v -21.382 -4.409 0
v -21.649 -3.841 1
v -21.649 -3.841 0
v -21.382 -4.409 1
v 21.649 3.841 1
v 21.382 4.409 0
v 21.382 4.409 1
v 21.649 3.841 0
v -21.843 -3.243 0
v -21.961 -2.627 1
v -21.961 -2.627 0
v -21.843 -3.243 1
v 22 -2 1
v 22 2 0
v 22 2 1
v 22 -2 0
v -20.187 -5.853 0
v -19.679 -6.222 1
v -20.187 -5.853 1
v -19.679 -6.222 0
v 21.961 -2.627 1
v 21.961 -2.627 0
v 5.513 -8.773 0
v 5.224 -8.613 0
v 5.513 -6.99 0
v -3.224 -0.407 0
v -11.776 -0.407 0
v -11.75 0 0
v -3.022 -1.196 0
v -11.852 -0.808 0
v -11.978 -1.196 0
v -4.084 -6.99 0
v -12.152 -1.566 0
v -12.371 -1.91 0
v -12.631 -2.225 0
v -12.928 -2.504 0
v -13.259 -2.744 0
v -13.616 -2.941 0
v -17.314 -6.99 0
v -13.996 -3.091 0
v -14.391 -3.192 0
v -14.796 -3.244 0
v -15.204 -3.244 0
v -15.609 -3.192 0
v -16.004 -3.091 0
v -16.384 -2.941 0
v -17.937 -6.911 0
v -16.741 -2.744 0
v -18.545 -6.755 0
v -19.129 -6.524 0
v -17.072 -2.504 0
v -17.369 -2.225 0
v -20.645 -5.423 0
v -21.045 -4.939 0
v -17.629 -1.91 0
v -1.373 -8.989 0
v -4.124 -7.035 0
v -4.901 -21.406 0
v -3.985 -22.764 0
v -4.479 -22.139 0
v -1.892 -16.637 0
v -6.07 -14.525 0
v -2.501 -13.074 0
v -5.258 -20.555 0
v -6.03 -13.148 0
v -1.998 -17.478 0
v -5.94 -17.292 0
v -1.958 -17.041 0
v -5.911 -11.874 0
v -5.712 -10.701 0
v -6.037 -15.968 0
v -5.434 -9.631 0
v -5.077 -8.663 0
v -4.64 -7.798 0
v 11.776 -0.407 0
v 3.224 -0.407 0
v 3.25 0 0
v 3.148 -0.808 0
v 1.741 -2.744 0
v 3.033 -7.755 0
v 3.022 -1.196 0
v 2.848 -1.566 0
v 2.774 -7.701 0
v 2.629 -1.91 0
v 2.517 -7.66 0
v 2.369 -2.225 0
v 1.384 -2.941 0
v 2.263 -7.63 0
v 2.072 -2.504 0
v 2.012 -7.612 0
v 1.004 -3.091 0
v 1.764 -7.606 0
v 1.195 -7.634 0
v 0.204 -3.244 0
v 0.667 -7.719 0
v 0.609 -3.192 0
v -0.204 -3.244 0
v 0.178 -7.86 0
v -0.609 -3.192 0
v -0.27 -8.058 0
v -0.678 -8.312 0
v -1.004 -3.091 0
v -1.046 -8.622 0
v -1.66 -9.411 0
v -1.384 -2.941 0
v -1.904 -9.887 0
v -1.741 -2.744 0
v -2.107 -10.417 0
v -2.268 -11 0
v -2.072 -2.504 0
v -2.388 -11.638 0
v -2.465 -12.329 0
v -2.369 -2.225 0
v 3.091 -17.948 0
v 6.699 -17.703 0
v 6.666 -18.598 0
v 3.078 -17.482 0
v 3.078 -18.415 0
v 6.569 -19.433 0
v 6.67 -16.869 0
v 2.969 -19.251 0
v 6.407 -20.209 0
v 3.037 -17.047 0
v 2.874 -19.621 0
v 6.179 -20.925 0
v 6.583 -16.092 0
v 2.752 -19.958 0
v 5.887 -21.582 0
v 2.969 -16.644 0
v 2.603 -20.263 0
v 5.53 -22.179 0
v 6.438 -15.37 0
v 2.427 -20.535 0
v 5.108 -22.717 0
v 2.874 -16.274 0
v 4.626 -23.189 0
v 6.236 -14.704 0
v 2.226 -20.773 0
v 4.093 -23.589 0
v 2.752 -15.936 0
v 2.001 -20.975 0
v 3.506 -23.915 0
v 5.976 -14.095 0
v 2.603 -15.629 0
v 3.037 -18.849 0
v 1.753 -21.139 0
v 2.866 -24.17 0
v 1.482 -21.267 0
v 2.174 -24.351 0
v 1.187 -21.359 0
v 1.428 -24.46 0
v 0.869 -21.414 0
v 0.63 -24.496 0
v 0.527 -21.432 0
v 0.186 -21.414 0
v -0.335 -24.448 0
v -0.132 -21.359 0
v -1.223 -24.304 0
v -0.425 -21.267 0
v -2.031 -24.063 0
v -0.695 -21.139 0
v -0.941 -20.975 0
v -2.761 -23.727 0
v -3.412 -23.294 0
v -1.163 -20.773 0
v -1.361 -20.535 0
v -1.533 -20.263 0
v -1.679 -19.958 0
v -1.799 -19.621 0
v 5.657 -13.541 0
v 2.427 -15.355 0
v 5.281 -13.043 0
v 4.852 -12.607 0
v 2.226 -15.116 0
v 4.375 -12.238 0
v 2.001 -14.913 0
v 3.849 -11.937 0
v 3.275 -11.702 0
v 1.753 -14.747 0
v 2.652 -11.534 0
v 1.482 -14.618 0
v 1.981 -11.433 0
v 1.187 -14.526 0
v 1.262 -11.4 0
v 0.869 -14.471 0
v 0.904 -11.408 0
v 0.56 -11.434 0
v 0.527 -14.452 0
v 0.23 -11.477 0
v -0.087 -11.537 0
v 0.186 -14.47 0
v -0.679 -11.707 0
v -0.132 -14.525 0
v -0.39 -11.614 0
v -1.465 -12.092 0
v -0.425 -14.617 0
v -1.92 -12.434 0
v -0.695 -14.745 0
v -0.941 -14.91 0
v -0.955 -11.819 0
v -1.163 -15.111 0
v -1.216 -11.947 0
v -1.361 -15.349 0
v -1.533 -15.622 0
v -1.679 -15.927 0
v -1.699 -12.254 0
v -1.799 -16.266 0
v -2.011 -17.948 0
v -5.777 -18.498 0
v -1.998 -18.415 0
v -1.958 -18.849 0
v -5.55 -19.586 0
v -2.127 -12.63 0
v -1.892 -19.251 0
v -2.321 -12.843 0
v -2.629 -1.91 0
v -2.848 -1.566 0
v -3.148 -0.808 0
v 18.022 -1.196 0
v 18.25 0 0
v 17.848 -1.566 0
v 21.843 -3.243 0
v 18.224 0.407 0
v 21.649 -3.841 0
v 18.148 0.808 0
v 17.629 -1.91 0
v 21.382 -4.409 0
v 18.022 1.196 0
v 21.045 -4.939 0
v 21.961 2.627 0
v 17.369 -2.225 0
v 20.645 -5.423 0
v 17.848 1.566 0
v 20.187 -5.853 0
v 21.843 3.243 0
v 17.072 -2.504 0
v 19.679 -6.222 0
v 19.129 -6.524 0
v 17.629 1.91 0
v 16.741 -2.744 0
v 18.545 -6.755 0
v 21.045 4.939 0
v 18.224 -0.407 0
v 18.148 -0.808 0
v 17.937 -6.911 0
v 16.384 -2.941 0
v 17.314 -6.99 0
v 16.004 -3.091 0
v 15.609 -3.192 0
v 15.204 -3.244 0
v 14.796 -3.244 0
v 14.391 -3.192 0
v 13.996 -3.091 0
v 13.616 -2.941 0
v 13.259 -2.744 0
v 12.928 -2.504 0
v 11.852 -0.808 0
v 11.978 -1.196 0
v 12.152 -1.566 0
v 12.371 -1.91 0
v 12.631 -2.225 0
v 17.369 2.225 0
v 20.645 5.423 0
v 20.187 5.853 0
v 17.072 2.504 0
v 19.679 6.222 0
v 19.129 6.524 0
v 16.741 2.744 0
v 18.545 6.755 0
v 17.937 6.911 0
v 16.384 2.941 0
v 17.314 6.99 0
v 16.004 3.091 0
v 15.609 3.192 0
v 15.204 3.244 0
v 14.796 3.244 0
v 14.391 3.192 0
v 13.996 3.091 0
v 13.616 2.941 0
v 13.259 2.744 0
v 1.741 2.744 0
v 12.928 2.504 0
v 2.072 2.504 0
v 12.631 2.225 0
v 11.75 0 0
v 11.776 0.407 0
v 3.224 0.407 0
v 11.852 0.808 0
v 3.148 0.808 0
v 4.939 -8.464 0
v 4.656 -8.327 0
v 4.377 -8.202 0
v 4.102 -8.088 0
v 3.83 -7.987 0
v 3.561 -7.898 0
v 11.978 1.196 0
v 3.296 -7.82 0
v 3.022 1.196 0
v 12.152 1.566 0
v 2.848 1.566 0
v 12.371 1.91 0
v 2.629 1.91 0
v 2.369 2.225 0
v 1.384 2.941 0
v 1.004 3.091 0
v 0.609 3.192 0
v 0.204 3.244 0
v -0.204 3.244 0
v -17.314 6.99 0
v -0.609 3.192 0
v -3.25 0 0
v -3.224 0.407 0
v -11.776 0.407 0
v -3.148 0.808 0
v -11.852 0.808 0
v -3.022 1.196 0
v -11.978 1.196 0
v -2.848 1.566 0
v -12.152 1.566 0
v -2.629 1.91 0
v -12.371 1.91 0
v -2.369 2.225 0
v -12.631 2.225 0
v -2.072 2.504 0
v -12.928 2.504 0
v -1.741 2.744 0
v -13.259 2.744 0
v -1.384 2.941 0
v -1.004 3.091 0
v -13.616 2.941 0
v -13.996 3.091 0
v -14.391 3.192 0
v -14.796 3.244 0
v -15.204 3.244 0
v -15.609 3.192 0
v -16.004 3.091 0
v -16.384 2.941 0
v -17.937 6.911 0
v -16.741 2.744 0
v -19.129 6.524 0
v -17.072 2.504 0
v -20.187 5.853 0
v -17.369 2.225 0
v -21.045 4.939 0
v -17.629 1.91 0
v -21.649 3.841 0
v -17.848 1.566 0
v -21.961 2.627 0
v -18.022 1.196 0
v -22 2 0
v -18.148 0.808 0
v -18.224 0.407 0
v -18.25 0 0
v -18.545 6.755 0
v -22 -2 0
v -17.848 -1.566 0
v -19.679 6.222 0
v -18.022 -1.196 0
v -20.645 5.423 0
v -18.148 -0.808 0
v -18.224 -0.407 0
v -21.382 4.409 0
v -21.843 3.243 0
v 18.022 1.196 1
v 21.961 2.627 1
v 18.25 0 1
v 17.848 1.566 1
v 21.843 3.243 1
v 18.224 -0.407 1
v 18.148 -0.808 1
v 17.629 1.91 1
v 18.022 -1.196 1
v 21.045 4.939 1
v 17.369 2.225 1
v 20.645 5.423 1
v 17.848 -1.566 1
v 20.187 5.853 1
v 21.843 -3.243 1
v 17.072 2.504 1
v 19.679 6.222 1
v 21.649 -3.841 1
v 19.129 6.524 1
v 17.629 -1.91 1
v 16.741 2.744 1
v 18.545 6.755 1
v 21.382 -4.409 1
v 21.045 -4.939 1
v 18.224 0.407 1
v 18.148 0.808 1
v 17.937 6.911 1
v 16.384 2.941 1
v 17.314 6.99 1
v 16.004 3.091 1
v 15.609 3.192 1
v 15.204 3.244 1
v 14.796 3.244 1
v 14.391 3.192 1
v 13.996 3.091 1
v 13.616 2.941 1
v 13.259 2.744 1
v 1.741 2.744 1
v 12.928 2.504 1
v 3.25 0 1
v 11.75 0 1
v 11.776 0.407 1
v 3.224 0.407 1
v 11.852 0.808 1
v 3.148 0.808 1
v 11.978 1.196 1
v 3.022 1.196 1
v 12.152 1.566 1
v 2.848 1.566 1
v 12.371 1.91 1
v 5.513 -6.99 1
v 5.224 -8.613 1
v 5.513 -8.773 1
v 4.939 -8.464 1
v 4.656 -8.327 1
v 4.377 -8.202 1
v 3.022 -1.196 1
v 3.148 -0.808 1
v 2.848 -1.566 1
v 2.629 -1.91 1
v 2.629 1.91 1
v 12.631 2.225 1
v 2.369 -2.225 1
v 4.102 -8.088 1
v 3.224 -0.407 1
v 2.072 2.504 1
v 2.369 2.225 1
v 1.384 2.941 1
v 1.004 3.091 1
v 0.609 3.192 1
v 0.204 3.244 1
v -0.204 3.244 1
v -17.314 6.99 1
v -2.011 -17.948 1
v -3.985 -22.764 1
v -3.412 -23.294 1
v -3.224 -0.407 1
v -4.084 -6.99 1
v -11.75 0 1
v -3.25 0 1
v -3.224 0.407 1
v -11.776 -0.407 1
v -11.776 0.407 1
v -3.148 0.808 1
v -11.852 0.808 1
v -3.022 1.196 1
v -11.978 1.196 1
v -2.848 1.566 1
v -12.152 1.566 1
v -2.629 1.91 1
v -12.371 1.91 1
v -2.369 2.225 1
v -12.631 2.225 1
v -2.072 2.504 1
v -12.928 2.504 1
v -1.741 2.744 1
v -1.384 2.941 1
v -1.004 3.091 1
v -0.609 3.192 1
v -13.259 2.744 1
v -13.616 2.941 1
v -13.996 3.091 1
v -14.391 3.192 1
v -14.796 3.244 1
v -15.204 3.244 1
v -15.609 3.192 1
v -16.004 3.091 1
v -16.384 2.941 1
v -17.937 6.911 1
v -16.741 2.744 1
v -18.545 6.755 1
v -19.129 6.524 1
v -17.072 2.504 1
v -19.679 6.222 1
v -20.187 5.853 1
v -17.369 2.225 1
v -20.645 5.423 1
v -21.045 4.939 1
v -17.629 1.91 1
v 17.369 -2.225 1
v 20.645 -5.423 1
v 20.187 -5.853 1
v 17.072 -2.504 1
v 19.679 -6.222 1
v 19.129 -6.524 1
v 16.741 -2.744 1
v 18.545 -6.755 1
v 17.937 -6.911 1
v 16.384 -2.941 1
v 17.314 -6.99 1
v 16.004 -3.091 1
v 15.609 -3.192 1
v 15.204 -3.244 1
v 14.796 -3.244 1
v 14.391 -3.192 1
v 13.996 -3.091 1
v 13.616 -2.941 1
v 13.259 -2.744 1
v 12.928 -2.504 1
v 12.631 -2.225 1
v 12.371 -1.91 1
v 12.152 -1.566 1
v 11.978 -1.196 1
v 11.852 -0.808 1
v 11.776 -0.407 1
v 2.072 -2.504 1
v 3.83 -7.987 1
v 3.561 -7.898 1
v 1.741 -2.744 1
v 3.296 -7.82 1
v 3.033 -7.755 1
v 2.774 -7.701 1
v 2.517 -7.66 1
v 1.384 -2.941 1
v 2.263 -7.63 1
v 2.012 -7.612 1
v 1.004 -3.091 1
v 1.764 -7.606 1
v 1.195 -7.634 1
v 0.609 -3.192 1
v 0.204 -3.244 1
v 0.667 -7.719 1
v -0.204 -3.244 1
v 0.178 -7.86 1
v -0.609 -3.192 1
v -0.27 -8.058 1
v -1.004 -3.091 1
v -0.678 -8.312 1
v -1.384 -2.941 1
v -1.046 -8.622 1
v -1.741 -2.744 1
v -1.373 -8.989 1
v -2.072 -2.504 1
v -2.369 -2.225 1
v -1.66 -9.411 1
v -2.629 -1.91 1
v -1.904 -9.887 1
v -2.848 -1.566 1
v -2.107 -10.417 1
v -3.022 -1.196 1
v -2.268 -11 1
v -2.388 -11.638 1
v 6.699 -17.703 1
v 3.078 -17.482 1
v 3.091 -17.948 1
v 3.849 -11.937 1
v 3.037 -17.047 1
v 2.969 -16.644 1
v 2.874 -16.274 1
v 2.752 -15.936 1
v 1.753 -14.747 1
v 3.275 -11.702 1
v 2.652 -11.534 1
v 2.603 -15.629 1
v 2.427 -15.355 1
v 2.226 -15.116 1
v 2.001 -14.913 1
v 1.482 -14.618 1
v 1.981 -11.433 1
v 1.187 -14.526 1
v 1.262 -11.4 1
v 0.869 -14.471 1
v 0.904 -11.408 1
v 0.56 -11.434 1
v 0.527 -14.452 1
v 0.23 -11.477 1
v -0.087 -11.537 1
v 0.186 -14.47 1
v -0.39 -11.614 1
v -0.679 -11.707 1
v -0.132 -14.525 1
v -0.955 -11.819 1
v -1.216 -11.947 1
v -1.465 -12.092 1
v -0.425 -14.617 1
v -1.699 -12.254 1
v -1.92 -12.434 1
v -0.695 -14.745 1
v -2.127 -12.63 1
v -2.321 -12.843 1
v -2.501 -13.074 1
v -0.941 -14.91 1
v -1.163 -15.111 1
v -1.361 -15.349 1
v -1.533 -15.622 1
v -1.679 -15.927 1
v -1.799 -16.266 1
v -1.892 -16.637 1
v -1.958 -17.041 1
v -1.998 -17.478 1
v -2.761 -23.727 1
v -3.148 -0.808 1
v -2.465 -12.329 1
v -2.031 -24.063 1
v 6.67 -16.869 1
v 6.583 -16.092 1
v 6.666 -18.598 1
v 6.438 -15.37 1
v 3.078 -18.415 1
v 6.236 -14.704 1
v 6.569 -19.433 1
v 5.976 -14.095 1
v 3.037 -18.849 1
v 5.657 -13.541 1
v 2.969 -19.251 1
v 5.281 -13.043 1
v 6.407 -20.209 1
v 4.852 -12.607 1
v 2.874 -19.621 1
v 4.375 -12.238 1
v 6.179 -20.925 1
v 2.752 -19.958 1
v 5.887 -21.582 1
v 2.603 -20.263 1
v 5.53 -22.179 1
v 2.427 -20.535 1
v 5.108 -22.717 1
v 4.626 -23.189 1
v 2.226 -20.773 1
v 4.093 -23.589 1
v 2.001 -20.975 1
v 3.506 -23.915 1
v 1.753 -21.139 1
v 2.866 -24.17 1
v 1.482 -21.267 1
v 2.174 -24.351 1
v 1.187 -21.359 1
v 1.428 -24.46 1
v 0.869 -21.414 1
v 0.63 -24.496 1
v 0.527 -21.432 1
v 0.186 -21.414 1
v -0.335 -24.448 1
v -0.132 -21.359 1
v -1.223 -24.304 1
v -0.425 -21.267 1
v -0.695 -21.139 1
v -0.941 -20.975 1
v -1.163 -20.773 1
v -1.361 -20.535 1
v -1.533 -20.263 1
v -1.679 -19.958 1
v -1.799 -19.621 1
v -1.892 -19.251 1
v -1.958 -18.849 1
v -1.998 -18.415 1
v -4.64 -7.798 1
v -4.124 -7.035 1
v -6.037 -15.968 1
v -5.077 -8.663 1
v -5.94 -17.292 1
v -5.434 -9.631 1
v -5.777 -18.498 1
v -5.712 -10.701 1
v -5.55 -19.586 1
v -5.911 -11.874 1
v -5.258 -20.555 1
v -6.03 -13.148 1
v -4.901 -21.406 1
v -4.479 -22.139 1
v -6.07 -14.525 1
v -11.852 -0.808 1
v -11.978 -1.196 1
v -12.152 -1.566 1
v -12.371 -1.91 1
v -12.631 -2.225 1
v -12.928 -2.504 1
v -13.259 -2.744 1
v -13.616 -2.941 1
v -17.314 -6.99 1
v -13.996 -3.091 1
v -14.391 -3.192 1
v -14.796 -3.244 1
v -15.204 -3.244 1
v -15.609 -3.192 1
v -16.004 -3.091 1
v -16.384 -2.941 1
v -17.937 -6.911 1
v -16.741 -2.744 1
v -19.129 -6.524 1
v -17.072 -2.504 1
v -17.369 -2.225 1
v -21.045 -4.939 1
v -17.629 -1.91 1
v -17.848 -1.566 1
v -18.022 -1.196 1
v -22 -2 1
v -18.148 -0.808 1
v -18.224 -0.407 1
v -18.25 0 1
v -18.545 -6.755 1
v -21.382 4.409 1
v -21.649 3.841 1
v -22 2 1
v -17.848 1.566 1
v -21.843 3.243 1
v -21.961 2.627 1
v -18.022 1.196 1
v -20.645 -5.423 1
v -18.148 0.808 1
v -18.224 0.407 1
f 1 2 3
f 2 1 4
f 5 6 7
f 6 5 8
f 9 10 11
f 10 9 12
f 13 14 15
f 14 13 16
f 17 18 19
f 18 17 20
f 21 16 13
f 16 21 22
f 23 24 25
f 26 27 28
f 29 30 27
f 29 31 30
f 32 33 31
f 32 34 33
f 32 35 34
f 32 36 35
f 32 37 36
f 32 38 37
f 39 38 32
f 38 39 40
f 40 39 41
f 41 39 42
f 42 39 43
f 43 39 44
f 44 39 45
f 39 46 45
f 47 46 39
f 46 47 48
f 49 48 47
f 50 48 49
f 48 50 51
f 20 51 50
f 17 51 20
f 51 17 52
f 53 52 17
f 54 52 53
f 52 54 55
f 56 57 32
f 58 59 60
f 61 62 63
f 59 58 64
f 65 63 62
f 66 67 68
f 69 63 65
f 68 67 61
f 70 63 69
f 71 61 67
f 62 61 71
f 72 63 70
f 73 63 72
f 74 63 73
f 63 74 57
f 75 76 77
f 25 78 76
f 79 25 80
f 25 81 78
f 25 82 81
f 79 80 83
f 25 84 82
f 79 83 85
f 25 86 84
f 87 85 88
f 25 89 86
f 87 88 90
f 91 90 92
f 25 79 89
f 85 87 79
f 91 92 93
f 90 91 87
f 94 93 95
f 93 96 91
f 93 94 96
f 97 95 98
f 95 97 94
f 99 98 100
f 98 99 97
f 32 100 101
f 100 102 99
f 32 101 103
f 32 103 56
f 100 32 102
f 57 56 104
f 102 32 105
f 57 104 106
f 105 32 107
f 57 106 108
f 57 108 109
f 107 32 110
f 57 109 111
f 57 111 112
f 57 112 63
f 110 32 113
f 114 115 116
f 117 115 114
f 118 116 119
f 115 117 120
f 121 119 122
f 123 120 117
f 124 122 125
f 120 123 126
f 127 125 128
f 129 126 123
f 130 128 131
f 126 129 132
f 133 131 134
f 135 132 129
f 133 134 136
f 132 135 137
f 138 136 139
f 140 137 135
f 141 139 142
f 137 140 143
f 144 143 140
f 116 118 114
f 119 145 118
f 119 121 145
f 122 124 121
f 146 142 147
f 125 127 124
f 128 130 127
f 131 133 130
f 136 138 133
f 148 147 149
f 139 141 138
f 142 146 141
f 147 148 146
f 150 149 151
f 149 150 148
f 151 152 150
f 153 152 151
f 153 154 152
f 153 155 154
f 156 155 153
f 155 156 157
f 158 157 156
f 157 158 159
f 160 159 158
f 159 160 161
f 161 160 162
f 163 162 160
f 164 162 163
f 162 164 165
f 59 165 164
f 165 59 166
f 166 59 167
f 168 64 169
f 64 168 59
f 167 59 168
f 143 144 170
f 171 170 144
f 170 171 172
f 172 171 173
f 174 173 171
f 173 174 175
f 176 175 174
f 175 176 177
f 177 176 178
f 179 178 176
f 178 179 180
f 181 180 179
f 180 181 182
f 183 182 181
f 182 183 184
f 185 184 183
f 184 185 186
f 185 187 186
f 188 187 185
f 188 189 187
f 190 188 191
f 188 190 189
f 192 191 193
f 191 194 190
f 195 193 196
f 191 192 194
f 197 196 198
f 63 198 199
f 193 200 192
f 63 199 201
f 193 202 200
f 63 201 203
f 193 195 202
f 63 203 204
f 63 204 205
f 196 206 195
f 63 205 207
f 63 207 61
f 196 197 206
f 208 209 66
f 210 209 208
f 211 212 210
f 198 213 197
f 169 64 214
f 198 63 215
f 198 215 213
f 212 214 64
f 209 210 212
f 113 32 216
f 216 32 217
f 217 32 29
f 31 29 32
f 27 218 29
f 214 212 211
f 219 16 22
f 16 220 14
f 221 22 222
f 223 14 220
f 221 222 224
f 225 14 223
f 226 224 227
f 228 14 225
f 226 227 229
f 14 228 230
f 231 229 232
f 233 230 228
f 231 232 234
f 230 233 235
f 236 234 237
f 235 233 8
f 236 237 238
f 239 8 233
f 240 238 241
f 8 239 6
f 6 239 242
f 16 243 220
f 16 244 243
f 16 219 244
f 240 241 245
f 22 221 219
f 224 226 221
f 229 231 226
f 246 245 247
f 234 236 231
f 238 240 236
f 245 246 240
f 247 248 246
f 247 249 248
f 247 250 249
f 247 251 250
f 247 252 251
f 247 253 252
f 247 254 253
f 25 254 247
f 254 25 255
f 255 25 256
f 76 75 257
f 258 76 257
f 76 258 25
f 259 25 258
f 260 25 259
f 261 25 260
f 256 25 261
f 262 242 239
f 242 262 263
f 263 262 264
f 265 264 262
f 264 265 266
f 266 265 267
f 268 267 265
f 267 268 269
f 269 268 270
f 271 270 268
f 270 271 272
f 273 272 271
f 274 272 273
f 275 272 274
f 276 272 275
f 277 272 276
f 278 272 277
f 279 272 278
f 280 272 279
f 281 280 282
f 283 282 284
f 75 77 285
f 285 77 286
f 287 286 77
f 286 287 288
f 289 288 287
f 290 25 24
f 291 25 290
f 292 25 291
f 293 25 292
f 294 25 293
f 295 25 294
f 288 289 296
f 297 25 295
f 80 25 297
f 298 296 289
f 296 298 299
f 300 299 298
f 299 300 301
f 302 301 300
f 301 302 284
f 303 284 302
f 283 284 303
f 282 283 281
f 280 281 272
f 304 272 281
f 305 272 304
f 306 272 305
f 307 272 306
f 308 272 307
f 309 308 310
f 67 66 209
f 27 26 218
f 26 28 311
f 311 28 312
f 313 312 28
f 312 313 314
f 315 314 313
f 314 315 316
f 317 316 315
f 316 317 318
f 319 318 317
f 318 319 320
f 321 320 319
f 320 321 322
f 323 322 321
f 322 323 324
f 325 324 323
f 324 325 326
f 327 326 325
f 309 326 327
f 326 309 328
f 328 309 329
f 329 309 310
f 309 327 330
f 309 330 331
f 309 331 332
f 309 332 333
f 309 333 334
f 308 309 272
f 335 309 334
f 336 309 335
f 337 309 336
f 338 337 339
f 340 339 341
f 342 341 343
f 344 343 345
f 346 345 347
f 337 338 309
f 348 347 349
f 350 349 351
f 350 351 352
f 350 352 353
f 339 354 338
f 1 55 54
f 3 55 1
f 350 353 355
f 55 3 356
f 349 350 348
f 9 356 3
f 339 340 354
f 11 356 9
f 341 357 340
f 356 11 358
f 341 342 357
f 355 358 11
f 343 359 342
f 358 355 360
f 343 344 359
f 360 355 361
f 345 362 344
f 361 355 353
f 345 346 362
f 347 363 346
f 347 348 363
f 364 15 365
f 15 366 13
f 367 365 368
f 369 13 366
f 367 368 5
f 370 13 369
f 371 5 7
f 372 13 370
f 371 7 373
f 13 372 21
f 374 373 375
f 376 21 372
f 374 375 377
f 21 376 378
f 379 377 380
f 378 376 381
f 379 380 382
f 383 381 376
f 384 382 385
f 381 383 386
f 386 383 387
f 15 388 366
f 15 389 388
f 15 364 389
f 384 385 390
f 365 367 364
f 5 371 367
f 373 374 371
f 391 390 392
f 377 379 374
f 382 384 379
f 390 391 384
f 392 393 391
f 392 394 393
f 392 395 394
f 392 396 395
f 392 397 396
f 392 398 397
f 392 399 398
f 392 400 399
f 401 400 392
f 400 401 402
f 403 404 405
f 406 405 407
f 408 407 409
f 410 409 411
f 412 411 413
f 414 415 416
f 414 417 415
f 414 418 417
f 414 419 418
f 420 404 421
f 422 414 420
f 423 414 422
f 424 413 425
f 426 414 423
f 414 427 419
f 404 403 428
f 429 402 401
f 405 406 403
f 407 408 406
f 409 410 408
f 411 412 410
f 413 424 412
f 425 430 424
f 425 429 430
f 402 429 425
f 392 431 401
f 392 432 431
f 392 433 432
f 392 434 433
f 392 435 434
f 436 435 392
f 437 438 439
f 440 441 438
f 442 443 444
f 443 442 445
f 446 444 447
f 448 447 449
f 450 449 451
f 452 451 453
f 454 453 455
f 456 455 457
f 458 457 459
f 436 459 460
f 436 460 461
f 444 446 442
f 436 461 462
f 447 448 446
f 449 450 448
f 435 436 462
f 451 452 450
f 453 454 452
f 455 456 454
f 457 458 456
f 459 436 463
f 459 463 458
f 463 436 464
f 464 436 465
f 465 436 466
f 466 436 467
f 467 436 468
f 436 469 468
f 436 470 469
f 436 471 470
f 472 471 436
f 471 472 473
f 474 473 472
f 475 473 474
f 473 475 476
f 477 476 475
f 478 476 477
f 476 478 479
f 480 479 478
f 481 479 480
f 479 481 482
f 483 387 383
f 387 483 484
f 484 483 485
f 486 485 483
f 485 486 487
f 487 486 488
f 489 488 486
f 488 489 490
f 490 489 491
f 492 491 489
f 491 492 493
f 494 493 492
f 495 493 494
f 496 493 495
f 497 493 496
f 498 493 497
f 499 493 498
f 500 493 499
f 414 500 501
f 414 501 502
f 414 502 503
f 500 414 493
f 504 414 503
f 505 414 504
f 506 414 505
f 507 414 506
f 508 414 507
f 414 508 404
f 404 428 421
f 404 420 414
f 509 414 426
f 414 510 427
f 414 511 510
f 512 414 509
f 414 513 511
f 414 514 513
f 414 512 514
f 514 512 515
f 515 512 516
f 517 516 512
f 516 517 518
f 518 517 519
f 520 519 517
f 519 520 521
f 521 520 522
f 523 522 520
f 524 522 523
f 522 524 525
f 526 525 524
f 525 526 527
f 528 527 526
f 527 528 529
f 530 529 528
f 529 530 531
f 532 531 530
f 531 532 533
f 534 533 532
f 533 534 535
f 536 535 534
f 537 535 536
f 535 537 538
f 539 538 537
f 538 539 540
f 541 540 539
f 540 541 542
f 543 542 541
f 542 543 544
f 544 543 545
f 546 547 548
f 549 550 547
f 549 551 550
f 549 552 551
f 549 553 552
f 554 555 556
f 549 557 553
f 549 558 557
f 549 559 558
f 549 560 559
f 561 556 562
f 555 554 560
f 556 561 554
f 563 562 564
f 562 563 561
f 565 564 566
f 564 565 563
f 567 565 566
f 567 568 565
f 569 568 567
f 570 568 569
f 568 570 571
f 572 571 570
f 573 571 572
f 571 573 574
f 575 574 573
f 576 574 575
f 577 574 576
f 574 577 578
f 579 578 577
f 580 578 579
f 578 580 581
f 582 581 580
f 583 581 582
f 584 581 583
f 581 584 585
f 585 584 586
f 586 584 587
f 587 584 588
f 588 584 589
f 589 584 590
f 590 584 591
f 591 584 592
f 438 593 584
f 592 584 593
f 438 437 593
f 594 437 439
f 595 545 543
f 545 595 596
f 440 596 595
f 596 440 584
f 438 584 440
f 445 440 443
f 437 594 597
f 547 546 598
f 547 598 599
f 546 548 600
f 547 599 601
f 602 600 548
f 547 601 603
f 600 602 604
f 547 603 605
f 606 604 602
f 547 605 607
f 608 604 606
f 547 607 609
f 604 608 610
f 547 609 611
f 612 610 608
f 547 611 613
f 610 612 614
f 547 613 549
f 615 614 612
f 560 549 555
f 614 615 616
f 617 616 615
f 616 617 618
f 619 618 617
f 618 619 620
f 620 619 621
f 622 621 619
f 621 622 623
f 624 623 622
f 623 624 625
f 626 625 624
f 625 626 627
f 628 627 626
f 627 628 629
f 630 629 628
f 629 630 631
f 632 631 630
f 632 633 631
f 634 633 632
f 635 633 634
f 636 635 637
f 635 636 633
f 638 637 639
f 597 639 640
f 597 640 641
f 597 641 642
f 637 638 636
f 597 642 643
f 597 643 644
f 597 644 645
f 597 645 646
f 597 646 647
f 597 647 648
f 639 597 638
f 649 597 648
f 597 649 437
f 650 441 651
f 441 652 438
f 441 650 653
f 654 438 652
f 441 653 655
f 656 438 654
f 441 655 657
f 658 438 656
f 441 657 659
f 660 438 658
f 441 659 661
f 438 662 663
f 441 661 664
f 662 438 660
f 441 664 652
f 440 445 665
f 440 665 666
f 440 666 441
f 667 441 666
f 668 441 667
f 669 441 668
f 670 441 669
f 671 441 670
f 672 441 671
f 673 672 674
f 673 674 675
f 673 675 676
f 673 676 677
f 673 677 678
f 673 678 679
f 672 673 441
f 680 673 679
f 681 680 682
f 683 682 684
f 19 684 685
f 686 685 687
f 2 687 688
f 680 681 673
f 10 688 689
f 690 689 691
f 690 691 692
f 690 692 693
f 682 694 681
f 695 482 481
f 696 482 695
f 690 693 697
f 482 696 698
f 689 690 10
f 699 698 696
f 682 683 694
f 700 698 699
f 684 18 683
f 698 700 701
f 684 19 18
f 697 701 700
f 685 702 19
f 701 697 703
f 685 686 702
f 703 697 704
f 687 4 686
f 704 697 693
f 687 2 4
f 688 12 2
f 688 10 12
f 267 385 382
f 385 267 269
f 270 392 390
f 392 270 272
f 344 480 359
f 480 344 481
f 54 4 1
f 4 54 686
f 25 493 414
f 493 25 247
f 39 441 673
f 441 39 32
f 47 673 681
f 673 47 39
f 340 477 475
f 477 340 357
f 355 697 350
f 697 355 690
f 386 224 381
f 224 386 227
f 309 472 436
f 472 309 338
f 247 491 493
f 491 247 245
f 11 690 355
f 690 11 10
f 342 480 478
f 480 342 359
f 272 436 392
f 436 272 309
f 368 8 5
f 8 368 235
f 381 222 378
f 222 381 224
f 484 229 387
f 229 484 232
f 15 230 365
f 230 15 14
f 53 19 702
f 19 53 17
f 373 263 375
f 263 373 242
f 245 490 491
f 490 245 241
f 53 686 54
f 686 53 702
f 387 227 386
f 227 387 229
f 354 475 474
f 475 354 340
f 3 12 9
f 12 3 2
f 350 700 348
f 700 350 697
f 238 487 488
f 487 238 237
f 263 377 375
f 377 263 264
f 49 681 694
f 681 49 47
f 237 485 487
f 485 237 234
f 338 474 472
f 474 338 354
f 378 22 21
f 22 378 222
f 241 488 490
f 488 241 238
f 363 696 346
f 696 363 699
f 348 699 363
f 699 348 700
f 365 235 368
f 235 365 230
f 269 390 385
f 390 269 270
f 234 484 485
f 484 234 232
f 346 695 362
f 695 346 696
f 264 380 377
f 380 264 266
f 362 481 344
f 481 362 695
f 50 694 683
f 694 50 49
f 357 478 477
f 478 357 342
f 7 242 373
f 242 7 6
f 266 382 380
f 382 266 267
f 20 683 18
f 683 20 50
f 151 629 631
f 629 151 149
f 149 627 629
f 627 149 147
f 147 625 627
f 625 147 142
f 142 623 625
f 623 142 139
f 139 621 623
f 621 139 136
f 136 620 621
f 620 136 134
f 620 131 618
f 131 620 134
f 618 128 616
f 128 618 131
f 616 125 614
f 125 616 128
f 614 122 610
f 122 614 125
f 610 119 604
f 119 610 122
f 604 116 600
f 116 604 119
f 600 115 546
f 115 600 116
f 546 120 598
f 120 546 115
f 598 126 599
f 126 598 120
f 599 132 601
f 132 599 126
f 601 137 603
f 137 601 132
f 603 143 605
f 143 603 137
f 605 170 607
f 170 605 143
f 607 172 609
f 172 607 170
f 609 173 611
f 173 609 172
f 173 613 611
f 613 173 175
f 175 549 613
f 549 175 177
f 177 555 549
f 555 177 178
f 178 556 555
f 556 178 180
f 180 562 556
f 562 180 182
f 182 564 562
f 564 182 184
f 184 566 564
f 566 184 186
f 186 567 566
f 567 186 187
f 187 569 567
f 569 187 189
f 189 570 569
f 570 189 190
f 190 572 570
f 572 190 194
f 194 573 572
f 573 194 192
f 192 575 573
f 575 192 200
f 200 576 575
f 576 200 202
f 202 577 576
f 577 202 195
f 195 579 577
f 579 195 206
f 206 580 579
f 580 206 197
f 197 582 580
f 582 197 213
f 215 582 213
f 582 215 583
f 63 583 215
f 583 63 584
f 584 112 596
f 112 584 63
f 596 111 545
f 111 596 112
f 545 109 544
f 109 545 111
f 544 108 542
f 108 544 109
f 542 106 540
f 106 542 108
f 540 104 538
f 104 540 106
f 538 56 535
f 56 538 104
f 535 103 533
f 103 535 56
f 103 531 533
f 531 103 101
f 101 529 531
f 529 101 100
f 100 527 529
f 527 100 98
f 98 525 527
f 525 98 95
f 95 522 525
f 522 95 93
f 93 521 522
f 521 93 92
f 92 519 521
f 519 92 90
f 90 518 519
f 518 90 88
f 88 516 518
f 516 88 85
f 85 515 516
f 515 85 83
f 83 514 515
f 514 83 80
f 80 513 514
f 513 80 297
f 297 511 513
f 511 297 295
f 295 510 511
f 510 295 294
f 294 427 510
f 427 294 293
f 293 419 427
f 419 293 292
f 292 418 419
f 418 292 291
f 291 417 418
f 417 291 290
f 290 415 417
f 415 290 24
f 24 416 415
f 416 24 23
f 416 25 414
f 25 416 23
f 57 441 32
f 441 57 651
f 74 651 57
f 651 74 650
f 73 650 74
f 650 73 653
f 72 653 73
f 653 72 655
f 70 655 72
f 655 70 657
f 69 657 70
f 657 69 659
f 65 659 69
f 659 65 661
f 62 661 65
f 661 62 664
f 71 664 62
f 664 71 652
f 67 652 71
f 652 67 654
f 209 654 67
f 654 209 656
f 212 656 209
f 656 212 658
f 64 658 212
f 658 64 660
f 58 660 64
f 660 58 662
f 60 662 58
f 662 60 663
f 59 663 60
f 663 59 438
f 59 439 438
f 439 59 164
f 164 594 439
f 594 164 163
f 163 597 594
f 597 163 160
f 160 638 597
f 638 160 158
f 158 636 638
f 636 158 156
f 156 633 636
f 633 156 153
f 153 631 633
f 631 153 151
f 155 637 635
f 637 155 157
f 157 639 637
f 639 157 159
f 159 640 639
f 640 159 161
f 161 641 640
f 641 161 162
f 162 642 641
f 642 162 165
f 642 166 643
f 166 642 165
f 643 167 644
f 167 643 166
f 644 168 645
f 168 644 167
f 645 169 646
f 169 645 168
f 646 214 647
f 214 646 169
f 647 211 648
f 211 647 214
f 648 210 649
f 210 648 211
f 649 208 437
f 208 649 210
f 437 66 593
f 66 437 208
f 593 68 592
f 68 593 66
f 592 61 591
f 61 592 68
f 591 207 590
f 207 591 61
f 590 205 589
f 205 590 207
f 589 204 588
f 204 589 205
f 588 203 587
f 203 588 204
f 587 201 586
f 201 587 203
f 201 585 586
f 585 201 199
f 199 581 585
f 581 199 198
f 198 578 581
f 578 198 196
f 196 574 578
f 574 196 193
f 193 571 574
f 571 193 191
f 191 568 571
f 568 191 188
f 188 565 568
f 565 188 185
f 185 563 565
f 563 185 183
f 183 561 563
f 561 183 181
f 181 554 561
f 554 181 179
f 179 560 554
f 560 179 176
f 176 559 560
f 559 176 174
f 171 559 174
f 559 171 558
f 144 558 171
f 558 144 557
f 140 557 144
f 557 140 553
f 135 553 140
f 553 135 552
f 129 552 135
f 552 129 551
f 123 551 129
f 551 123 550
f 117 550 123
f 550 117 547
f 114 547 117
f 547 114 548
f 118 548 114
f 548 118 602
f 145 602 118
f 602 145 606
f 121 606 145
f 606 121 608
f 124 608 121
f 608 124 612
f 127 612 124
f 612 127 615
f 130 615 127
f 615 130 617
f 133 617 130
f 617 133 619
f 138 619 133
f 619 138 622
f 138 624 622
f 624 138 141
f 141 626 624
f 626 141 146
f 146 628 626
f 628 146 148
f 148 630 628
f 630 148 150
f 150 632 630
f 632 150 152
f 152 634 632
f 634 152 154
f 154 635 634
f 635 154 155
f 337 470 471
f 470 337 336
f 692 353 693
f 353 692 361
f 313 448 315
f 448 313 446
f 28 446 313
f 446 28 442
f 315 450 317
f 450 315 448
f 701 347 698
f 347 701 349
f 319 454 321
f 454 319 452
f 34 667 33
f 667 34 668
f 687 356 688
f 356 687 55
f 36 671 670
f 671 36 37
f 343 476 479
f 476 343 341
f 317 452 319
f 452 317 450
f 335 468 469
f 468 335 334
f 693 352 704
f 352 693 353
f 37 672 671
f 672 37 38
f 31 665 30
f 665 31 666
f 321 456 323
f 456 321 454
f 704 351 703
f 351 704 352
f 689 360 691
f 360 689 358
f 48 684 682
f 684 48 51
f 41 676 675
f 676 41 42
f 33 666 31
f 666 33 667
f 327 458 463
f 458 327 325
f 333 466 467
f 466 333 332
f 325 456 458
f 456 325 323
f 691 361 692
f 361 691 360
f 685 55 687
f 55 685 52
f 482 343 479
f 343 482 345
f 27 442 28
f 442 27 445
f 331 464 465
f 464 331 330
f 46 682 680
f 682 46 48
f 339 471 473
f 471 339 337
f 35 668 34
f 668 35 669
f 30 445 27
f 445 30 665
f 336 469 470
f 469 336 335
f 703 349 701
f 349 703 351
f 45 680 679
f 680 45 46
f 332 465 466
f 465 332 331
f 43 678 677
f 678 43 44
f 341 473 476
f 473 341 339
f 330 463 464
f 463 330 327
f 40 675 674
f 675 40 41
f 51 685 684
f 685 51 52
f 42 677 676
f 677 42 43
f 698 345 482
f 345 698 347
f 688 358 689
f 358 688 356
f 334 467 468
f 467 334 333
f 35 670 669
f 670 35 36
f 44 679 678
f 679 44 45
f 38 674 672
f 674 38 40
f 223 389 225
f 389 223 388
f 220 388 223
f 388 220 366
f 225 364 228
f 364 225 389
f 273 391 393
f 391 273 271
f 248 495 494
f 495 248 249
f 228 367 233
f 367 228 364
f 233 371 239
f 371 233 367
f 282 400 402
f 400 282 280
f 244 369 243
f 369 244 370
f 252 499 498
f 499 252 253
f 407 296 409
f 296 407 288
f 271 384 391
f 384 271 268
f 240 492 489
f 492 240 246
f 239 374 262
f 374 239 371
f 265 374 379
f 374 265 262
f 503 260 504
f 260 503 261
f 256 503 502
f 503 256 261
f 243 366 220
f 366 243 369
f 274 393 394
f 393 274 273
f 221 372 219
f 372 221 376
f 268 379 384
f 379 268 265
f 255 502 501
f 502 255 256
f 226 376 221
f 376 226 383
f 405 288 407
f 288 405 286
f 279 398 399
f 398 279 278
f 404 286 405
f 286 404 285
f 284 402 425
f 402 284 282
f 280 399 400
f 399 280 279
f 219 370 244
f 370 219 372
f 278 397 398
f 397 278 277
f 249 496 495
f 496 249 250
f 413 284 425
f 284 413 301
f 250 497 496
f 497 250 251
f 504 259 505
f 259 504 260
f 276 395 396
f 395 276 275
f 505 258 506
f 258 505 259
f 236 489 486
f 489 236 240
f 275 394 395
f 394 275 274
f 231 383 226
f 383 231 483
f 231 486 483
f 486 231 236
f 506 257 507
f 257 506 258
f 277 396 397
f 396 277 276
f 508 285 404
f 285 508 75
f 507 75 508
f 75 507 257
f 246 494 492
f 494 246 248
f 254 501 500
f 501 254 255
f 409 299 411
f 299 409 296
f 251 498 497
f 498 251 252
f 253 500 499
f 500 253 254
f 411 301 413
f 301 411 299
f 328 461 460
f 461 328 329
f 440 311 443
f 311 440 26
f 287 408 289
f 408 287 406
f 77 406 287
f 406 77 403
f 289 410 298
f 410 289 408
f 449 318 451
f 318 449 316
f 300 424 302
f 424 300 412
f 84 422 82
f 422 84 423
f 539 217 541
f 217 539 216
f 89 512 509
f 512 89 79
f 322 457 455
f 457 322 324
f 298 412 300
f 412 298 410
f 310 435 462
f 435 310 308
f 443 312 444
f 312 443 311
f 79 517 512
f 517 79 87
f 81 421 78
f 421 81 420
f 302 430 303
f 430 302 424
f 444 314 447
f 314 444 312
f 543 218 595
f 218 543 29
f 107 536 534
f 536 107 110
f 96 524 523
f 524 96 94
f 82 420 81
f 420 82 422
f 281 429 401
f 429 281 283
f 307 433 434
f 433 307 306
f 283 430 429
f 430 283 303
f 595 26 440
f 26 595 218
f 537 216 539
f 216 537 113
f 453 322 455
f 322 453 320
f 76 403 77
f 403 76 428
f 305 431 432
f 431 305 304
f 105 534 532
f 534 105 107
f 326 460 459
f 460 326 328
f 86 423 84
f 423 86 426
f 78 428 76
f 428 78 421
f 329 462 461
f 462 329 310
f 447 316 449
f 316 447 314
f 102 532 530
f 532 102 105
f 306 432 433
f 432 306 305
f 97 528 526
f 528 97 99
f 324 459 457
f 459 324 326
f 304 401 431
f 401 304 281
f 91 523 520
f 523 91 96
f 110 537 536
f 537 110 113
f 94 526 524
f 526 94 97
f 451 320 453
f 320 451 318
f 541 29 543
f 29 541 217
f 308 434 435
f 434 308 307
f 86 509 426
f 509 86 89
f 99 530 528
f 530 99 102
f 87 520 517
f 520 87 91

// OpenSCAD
$fn = 50;


difference() {
	union() {
		translate(v = [0, 0, 0]) {
			rotate(a = [0, 0, 0]) {
				hull() {
					translate(v = [-17.0000000000, 2.0000000000, 0]) {
						rotate(a = [0, 0, 0]) {
							translate(v = [0, 0, 0]) {
								rotate(a = [0, 0, 0]) {
									cylinder(h = 1, r = 5);
								}
							}
						}
					}
					translate(v = [17.0000000000, 2.0000000000, 0]) {
						rotate(a = [0, 0, 0]) {
							translate(v = [0, 0, 0]) {
								rotate(a = [0, 0, 0]) {
									cylinder(h = 1, r = 5);
								}
							}
						}
					}
					translate(v = [-17.0000000000, -2.0000000000, 0]) {
						rotate(a = [0, 0, 0]) {
							translate(v = [0, 0, 0]) {
								rotate(a = [0, 0, 0]) {
									cylinder(h = 1, r = 5);
								}
							}
						}
					}
					translate(v = [17.0000000000, -2.0000000000, 0]) {
						rotate(a = [0, 0, 0]) {
							translate(v = [0, 0, 0]) {
								rotate(a = [0, 0, 0]) {
									cylinder(h = 1, r = 5);
								}
							}
						}
					}
				}
			}
		}
		translate(v = [0, -5, 0]) {
			rotate(a = [0, 0, 0]) {
				linear_extrude(height = 1) {
					text(font = "DejaVu Sans Mono:style=Bold", halign = "center", size = 19.0000000000, text = "6", valign = "top");
				}
			}
		}
	}
	union() {
		translate(v = [-15.0000000000, 0.0000000000, -125.0000000000]) {
			rotate(a = [0, 0, 0]) {
				cylinder(h = 250, r = 3.2500000000);
			}
		}
		translate(v = [15.0000000000, 0.0000000000, -125.0000000000]) {
			rotate(a = [0, 0, 0]) {
				cylinder(h = 250, r = 3.2500000000);
			}
		}
		translate(v = [15.0000000000, 0.0000000000, -125.0000000000]) {
			rotate(a = [0, 0, 0]) {
				cylinder(h = 250, r = 3.2500000000);
			}
		}
		translate(v = [0, 0, -125.0000000000]) {
			rotate(a = [0, 0, 0]) {
				cylinder(h = 250, r = 3.2500000000);
			}
		}
	}
}
